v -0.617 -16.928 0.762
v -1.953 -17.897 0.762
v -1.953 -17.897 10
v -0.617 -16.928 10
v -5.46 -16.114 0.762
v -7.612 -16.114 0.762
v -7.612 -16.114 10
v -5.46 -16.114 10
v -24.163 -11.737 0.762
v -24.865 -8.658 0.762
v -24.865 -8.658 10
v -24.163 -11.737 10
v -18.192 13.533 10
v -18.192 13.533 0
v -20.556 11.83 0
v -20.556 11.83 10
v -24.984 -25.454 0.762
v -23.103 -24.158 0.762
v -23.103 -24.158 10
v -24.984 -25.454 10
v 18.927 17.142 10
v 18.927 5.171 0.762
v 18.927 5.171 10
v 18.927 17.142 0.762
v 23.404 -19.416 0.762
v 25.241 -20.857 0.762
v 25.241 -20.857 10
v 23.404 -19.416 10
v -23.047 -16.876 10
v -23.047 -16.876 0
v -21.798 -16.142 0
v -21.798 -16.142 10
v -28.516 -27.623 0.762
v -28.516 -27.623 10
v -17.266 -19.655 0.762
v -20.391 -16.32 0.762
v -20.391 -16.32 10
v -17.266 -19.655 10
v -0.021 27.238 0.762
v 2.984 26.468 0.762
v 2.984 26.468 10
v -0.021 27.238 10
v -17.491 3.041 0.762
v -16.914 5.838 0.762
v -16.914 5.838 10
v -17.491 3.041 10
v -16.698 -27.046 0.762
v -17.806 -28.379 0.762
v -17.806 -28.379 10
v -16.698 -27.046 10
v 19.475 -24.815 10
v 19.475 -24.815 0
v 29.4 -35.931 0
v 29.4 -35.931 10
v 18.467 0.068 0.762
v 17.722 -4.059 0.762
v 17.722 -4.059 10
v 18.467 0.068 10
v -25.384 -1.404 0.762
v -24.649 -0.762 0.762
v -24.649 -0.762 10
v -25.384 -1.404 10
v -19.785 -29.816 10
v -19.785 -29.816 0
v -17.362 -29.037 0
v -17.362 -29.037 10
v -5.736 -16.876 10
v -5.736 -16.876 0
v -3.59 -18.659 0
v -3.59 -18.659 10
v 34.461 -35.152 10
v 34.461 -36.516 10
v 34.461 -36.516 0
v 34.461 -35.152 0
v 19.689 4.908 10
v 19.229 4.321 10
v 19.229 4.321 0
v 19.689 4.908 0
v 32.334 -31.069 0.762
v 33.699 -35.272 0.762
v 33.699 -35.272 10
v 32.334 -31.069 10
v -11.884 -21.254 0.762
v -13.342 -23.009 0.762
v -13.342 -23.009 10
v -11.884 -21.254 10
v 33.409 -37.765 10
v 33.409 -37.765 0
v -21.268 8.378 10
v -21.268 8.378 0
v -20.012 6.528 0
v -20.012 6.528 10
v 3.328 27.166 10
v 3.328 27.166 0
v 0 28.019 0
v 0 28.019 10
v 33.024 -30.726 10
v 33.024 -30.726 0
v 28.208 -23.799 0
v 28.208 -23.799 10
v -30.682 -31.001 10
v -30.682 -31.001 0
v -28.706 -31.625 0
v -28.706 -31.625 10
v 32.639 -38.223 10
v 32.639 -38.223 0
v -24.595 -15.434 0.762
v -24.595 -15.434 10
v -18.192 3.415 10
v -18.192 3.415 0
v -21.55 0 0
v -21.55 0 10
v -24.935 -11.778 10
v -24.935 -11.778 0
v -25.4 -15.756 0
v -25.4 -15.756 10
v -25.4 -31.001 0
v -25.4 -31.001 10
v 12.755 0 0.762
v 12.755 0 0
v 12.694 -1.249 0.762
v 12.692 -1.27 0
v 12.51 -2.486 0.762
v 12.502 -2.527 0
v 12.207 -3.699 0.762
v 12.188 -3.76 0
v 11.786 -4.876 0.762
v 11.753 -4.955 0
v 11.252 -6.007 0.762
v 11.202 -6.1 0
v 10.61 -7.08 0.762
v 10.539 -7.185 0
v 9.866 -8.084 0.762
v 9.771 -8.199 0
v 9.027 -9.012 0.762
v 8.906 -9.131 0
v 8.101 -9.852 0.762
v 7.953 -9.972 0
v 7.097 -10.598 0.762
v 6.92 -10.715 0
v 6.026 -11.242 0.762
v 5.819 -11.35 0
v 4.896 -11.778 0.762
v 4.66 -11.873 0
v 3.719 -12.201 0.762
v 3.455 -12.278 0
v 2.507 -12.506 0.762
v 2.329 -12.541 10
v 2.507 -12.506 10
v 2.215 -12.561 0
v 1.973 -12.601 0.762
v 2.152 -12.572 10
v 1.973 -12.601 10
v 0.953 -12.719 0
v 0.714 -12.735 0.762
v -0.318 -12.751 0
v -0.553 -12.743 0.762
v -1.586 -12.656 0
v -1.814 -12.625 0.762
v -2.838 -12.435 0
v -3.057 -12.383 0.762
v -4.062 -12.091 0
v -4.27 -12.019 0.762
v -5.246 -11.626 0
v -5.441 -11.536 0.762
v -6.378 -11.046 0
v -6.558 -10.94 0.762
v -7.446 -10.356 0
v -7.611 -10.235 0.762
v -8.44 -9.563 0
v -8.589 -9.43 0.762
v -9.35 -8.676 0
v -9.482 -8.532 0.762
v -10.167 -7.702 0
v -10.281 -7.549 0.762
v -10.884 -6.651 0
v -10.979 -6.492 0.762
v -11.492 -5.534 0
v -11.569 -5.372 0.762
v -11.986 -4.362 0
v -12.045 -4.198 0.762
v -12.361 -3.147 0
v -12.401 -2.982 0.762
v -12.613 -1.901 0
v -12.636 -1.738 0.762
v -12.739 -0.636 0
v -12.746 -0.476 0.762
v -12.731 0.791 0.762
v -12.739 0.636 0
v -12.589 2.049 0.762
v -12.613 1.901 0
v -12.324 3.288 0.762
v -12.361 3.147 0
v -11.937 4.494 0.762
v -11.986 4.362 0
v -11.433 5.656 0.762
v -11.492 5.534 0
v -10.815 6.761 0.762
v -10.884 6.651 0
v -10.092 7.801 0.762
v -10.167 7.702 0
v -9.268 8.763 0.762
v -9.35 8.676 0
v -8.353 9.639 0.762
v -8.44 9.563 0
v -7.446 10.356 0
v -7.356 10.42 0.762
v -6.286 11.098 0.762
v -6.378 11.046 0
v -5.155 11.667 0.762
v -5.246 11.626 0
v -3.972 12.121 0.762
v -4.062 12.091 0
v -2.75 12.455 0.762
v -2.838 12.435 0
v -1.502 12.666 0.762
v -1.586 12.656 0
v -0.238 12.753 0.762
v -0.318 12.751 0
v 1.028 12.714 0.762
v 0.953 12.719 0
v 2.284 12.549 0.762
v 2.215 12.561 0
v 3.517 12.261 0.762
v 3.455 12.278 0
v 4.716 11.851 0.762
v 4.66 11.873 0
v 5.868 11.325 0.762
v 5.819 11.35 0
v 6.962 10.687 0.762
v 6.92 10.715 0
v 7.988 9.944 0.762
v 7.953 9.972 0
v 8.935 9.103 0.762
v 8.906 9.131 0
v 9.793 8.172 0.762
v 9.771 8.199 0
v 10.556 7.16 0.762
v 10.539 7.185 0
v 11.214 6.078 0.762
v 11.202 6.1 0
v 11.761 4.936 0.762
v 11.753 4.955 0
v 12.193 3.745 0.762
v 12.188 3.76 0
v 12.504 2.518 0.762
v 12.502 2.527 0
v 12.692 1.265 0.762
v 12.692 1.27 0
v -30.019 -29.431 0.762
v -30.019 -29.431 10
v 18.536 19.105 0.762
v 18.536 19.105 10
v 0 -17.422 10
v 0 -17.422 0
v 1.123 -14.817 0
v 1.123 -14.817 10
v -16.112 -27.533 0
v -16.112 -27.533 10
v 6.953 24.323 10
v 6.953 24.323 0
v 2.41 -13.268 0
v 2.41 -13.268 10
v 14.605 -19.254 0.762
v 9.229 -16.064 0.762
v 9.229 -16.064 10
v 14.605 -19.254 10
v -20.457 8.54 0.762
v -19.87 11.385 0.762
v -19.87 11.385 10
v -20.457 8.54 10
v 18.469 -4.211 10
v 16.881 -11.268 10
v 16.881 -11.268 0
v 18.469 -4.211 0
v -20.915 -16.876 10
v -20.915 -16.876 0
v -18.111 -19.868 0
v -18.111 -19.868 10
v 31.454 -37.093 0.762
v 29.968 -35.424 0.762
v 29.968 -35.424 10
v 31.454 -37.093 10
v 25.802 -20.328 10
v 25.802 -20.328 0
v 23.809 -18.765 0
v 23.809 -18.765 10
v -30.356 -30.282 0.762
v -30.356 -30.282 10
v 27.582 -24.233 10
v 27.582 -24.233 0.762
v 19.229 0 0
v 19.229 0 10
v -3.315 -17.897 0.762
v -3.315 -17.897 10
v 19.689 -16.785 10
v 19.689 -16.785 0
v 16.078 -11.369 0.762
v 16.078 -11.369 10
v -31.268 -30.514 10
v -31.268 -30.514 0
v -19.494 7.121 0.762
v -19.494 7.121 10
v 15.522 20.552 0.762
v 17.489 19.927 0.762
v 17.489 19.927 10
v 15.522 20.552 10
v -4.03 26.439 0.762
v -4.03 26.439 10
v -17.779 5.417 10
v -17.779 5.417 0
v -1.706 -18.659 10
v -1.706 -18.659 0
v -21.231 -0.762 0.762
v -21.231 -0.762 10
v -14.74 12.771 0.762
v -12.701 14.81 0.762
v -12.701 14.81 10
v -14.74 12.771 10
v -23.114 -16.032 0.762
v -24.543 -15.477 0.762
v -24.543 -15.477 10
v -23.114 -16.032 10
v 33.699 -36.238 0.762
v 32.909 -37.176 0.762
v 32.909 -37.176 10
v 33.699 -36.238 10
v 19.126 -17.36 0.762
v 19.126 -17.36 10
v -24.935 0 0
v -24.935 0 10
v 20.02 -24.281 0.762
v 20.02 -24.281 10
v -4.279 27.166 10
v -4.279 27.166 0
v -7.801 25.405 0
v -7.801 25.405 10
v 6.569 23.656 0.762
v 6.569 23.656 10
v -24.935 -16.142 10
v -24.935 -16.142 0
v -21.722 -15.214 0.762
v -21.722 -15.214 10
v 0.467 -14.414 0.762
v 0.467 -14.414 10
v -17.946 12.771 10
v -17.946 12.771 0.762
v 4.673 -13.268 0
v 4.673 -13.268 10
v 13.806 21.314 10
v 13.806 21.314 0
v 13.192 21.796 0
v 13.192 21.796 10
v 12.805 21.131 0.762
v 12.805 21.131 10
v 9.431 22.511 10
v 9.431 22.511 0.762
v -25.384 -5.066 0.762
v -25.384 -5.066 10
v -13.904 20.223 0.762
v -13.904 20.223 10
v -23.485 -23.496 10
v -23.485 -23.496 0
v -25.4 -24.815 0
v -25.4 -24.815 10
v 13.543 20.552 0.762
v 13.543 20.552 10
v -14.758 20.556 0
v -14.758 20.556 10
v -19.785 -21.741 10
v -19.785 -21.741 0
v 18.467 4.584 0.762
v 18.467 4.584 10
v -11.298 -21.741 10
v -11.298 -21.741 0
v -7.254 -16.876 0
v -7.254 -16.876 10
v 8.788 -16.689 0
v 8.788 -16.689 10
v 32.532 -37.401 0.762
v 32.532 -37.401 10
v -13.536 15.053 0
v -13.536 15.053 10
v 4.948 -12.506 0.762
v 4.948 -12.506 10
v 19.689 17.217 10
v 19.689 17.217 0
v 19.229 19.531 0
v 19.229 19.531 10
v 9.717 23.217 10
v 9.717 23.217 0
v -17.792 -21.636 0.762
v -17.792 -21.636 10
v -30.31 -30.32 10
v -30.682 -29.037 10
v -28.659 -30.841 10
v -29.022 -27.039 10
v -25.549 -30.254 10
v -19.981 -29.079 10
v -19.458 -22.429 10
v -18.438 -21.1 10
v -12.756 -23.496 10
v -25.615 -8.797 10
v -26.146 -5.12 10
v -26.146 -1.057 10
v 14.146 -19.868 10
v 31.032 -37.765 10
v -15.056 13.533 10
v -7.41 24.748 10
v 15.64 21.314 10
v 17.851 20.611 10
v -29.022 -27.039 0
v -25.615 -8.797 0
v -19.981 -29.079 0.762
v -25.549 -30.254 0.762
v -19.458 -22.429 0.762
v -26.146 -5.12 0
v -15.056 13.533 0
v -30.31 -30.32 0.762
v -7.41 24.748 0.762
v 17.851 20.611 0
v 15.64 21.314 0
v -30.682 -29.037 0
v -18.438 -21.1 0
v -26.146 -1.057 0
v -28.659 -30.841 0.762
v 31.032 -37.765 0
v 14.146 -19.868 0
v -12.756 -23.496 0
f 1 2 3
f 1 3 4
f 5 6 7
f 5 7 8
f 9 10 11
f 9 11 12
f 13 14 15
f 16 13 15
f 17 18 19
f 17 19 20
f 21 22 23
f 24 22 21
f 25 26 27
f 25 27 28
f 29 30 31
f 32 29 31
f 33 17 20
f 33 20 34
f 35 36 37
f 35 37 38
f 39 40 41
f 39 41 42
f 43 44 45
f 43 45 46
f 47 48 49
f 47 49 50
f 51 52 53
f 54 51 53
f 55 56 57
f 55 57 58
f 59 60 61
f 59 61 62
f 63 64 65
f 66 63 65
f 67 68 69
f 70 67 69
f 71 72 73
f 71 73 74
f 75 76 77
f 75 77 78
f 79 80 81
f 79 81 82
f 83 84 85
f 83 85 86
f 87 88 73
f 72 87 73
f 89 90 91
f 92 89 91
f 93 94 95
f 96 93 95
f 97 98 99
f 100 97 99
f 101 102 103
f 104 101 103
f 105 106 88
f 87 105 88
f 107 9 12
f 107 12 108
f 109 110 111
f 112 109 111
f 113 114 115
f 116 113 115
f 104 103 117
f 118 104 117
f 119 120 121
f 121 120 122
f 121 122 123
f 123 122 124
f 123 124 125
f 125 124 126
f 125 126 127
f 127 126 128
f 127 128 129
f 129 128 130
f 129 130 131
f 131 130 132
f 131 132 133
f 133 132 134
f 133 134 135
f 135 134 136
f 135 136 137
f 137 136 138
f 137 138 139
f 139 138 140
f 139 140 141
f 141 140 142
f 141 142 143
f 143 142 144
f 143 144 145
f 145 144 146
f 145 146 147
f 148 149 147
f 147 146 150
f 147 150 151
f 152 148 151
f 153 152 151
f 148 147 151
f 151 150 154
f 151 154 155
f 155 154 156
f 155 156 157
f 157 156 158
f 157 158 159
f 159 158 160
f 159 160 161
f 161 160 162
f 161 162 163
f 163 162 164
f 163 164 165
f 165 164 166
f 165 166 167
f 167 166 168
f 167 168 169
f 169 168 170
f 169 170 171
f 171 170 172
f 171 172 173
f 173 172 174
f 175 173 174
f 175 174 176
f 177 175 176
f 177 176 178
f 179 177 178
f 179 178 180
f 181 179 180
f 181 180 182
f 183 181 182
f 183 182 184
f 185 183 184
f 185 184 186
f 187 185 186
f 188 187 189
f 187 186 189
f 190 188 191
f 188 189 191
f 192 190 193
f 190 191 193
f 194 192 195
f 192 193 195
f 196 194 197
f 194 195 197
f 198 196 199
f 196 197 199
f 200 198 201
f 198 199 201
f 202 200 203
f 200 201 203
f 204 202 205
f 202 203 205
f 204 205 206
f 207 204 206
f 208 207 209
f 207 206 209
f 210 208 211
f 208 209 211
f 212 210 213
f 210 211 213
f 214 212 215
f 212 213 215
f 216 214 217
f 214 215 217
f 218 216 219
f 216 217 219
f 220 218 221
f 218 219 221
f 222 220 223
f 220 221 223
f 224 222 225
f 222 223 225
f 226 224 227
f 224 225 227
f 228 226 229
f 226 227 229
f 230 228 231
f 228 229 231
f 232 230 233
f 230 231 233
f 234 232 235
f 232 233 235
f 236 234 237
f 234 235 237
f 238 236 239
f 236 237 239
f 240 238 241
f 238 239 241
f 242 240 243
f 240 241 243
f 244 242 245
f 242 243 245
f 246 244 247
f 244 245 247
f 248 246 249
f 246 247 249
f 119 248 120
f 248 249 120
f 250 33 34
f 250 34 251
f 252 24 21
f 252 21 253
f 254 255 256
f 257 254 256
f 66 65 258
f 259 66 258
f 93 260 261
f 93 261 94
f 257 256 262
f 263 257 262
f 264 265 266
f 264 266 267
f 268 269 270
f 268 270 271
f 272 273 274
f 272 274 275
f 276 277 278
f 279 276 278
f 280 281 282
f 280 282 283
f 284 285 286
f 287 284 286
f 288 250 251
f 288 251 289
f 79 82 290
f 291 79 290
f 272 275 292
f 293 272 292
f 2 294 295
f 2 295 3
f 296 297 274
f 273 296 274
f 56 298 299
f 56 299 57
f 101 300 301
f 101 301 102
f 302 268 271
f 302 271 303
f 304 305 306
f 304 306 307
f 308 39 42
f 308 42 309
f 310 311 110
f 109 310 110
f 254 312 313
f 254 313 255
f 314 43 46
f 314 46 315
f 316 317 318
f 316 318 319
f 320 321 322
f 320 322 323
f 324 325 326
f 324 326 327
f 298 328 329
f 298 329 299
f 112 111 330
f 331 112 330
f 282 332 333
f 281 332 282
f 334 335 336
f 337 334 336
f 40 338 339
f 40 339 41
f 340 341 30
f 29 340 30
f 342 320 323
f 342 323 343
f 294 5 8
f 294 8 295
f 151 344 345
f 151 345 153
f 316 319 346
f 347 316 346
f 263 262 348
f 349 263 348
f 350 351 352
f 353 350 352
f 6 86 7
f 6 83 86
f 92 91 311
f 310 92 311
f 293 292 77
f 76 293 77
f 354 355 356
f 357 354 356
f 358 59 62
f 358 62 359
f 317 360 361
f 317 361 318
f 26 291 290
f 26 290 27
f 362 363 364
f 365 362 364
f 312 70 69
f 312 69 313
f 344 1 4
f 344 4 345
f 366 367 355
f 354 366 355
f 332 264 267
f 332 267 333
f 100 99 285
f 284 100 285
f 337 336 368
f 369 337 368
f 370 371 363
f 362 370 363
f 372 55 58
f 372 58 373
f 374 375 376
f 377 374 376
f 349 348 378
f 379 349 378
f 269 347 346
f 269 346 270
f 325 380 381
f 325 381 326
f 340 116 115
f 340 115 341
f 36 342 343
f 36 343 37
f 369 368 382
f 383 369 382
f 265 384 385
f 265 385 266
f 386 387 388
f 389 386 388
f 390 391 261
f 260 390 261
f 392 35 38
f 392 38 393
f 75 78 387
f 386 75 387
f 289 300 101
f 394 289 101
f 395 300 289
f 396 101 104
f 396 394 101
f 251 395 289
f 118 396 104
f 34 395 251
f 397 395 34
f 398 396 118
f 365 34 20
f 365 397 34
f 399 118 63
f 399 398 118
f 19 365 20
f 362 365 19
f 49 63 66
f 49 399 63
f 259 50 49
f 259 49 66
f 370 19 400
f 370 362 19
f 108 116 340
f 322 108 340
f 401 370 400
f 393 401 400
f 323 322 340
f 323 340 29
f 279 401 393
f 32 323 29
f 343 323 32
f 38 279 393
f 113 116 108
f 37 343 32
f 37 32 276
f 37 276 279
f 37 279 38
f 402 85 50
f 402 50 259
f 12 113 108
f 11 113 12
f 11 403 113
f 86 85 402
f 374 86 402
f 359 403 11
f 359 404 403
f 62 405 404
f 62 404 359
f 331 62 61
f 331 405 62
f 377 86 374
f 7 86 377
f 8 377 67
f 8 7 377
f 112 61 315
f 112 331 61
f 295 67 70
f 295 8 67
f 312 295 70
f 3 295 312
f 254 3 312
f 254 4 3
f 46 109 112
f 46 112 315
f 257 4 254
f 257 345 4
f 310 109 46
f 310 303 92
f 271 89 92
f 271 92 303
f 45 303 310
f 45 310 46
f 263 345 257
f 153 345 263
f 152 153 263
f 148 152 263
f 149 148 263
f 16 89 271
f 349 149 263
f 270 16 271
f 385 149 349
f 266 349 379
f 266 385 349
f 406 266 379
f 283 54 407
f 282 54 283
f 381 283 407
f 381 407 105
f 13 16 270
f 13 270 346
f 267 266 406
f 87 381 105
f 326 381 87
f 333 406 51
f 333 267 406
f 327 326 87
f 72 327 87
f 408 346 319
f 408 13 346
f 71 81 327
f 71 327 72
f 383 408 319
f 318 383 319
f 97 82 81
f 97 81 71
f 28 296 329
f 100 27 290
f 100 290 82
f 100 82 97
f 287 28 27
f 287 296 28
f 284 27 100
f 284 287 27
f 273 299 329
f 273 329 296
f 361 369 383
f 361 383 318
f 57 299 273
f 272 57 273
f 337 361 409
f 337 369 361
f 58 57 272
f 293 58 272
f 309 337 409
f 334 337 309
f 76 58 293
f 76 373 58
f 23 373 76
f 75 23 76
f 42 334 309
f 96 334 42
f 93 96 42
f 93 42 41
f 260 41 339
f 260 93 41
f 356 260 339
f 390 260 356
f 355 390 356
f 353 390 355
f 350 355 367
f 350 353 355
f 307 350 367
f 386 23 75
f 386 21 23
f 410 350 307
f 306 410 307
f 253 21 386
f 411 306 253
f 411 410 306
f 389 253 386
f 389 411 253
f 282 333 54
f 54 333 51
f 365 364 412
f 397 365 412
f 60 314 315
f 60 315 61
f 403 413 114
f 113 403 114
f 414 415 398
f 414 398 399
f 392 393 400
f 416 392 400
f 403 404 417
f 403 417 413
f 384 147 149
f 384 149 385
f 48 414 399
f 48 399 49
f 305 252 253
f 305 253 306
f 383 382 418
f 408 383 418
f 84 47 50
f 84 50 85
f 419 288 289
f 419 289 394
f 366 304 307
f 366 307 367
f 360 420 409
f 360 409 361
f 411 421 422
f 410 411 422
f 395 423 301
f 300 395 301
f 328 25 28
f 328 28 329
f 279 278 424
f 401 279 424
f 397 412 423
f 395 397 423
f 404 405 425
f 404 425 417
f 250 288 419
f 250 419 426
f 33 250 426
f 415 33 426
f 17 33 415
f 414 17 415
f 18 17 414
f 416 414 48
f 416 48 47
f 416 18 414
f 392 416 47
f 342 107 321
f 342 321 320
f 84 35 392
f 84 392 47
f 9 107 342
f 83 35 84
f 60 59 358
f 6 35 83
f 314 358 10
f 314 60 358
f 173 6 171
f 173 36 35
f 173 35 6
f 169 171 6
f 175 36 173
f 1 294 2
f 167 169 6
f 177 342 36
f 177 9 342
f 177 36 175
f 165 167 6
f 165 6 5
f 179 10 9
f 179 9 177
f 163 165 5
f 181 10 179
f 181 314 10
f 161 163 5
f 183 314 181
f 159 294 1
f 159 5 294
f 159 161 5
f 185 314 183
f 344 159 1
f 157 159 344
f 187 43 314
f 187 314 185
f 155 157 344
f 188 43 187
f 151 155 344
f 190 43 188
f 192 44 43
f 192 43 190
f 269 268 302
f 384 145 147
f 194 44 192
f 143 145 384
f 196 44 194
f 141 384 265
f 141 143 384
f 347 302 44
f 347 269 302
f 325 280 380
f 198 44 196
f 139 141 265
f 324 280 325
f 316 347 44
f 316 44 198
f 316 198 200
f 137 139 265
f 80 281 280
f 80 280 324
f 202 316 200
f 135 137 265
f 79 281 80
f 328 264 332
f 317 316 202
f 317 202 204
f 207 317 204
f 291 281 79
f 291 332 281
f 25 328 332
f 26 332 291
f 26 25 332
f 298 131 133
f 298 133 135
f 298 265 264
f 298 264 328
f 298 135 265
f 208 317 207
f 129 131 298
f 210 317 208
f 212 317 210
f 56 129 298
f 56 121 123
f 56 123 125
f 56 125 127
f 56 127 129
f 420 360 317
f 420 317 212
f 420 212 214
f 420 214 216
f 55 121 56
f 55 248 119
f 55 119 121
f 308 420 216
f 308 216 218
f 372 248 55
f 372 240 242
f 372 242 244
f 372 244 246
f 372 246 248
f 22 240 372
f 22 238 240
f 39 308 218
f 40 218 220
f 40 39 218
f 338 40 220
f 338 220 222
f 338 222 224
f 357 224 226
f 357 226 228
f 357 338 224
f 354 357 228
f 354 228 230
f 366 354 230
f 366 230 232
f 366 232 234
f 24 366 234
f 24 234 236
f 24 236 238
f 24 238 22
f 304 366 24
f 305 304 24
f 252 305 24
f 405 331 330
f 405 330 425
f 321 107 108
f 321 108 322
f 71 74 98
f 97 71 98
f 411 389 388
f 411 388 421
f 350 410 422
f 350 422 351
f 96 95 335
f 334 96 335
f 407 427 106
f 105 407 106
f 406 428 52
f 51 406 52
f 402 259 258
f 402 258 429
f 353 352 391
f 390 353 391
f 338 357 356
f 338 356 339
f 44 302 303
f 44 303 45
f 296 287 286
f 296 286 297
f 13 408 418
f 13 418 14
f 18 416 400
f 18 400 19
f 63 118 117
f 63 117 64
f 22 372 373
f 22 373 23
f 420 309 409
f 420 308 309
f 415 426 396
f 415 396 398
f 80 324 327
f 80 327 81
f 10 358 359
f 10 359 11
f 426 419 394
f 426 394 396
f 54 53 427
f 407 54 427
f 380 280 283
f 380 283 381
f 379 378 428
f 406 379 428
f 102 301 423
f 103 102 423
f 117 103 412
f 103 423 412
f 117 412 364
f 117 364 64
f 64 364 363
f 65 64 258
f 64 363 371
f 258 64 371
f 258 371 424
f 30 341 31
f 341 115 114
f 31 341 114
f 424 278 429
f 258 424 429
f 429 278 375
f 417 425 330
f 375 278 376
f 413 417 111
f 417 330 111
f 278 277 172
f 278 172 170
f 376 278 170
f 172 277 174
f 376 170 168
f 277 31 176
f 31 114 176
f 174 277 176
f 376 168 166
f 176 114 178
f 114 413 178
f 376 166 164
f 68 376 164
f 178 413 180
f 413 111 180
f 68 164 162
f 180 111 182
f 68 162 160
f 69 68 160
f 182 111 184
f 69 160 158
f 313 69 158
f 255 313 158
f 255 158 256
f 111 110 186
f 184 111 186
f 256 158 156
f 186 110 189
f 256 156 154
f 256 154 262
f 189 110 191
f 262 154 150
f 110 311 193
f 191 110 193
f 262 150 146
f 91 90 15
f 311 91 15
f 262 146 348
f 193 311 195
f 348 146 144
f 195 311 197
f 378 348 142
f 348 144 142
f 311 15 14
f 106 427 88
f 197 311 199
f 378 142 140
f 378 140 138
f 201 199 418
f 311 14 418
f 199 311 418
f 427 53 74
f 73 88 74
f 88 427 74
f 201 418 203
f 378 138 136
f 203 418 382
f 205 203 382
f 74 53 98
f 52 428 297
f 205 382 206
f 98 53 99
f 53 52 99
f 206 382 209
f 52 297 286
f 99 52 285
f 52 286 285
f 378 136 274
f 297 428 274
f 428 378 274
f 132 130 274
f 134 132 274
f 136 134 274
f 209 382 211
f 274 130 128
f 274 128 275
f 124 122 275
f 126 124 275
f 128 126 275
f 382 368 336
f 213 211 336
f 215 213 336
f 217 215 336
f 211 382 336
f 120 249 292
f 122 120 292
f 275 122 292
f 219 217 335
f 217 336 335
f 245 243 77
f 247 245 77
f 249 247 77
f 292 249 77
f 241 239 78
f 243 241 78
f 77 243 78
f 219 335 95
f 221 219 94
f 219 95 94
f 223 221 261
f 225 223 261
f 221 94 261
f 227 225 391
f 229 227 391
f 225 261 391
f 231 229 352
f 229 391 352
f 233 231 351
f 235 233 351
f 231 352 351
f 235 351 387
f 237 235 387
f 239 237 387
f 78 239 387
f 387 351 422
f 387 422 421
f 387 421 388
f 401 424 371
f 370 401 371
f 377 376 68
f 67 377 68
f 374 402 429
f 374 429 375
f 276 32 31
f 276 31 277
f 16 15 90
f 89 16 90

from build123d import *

# Parameters (mm, degrees)
F1_DEPTH = 10
F2_T     = -0.762
F3_R     = 12.7550536122
F4_DEPTH = 25.4


with BuildPart() as f1:
    # F0 (on Top) → F1 (new body)
    with BuildSketch(Plane.XY):
        Polygon((-7.8007113189, 25.4050213844), (-14.7581025958, 20.5559302121), (-13.5356634855, 15.0533653796), (-15.0557206944, 13.5333081707), (-18.1923042983, 13.5333081707), (-20.5559276198, 11.8295696557), (-21.2681274861, 8.3783324808), (-20.012428984, 6.527827587), (-17.7791882306, 5.4171900265), (-18.1923042983, 3.4152779263), (-21.5501468629, 0), (-24.9349009246, 0), (-26.1455569416, -1.0574074695), (-26.1455569416, -5.1203737967), (-25.6145708263, -8.7974648923), (-24.9349009246, -11.7783686146), (-25.3995768726, -15.7559095406), (-24.9349009246, -16.142109525), (-23.0465140194, -16.8757408121), (-21.7977536025, -16.142109525), (-20.9150481969, -16.8757408121), (-18.1111115962, -19.8680274189), (-18.4382367879, -21.0997294635), (-19.7853650898, -21.7411002789), (-23.4853252769, -23.4957698894), (-25.3995768726, -24.8154569417), (-29.0218316621, -27.0394197407), (-30.6820981205, -29.0370528883), (-31.2679782274, -30.5143610979), (-30.6820981205, -31.0012958944), (-28.7057235837, -31.6250957549), (-25.3995768726, -31.0012958944), (-19.7853650898, -29.8160724342), (-17.3616977744, -29.0370528883), (-16.1116474631, -27.5329919434), (-12.7562444109, -23.4957698894), (-11.2979090287, -21.7411002789), (-7.2542270645, -16.8757408121), (-5.7355757302, -16.8757408121), (-3.5900974181, -18.6588838696), (-1.705969451, -18.6588838696), (0, -17.422426492), (1.1230455963, -14.8166298422), (2.4098805152, -13.2683096454), (4.6730381437, -13.2683096454), (8.788285777, -16.688561067), (14.146274887, -19.8680274189), (19.4753222167, -24.8154569417), (29.3999388814, -35.9310284257), (31.0319885612, -37.7653092146), (32.639272511, -38.2234193385), (33.4090031683, -37.7653092146), (34.4607569277, -36.5162938833), (34.4607569277, -35.1515486836), (33.0238379538, -30.7261310518), (28.2081253827, -23.798527196), (25.8020885247, -20.3280491786), (23.8092746586, -18.7650527805), (19.688764587, -16.7849324644), (16.8812572956, -11.2681994215), (18.4691958129, -4.2106937617), (19.228663871, 0), (19.228663871, 4.3211282282), (19.688764587, 4.9077547155), (19.688764587, 10.1767061278), (19.688764587, 14.4955459982), (19.688764587, 17.2170065343), (19.228663871, 19.5308034597), (17.8511645645, 20.611198619), (15.6399458647, 21.313789199), (13.8063501083, 21.313789199), (13.1918145344, 21.7957794666), (9.7170434892, 23.2172757387), (6.9530224428, 24.3228841573), (3.3282164725, 27.1658785641), (0, 28.019279857), (-4.2789963759, 27.1658785641), align=None)
    extrude(amount=F1_DEPTH)

    # F2
    f2_openings = [f1.faces().sort_by_distance(p)[0] for p in [
        (-0.450246, -1.925405, 10),
    ]]
    offset(amount=F2_T, openings=f2_openings, kind=Kind.INTERSECTION)

    # F3 (on face) → F4 (cut)
    with BuildSketch(Plane(origin=(0, 0, 0), x_dir=(1, 0, 0), z_dir=(0, 0, -1))):
        Circle(F3_R)
    extrude(amount=-F4_DEPTH, mode=Mode.SUBTRACT)


solid = f1.part
